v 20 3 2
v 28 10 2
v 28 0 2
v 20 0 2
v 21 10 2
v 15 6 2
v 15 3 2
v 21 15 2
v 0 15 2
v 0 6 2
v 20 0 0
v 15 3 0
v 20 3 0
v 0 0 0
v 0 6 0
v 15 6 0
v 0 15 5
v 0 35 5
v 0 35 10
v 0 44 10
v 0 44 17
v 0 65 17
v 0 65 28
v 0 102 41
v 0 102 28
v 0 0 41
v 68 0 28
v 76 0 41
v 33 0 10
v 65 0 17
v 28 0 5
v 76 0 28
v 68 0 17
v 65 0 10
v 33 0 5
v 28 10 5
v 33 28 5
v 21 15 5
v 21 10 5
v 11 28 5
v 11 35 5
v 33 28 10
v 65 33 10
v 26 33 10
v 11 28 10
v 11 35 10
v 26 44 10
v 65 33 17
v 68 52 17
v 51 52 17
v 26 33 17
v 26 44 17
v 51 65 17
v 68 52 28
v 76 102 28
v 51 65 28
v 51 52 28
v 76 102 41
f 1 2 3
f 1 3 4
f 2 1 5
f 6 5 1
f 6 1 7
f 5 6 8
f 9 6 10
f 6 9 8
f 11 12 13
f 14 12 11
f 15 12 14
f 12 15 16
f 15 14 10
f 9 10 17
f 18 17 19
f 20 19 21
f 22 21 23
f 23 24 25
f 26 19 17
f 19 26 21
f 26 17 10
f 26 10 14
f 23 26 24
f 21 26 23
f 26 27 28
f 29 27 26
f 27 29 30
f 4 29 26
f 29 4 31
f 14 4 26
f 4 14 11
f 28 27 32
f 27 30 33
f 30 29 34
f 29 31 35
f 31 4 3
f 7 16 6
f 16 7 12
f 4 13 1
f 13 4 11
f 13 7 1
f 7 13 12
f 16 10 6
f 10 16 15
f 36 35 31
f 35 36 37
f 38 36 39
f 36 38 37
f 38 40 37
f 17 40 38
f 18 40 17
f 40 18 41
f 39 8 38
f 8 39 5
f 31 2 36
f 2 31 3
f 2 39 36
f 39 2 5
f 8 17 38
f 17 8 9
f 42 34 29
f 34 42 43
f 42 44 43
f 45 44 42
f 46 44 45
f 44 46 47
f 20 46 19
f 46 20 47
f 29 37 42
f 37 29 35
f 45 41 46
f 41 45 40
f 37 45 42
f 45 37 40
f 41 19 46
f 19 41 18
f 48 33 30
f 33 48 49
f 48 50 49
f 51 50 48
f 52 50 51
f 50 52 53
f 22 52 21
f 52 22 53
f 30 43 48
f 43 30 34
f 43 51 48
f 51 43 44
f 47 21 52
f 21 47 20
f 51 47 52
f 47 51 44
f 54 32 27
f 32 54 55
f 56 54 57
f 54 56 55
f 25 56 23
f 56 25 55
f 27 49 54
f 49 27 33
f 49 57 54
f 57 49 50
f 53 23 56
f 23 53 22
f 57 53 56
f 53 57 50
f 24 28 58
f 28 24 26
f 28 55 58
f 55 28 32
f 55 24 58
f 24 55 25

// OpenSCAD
translate([2.5, 1.5, 1.0]) color([0.969306850533619, 0.23531586477578126, 0.13212860983739783]) cube([5, 3, 2], center=true);
translate([7.5, 1.5, 1.0]) color([0.23368957459901674, 0.38460662479298113, 0.6084990843462054]) cube([5, 3, 2], center=true);
translate([12.5, 1.5, 1.0]) color([0.1325407149567407, 0.4984659545183915, 0.9178662904203972]) cube([5, 3, 2], center=true);
translate([17.5, 1.5, 1.0]) color([0.6160167741323543, 0.02601445858505036, 0.596125612844632]) cube([5, 3, 2], center=true);
translate([2.5, 4.5, 1.0]) color([0.48919913512172475, 0.30869925031539414, 0.9586301909392594]) cube([5, 3, 2], center=true);
translate([7.5, 4.5, 1.0]) color([0.5555224541780607, 0.16303723797834868, 0.8790785483620981]) cube([5, 3, 2], center=true);
translate([12.5, 4.5, 1.0]) color([0.8092366229990562, 0.7373715302416316, 0.5460288399006699]) cube([5, 3, 2], center=true);
translate([3.5, 2.5, 3.5]) color([0.7042240787132147, 0.07877233817546292, 0.13744427713979768]) cube([7, 5, 3], center=true);
translate([10.5, 2.5, 3.5]) color([0.40185422229333856, 0.1910666288561843, 0.31642065037316636]) cube([7, 5, 3], center=true);
translate([17.5, 2.5, 3.5]) color([0.2917281417853558, 0.9437754009602987, 0.20866341172373193]) cube([7, 5, 3], center=true);
translate([24.5, 2.5, 3.5]) color([0.3151573145870893, 0.7470721078045024, 0.24960896628473228]) cube([7, 5, 3], center=true);
translate([3.5, 7.5, 3.5]) color([0.8629627260654799, 0.6684326881602258, 0.6597695027130189]) cube([7, 5, 3], center=true);
translate([10.5, 7.5, 3.5]) color([0.22591717735012307, 0.3441717078654829, 0.16233220178561225]) cube([7, 5, 3], center=true);
translate([17.5, 7.5, 3.5]) color([0.01697652307419406, 0.5735931064152219, 0.05818297514553228]) cube([7, 5, 3], center=true);
translate([24.5, 7.5, 3.5]) color([0.6304378073753134, 0.35341956482818127, 0.49110709598533775]) cube([7, 5, 3], center=true);
translate([3.5, 12.5, 3.5]) color([0.06132304686728618, 0.24146702174069912, 0.012441234482642782]) cube([7, 5, 3], center=true);
translate([10.5, 12.5, 3.5]) color([0.9455344576677447, 0.3266678829978785, 0.820956849026723]) cube([7, 5, 3], center=true);
translate([17.5, 12.5, 3.5]) color([0.34492851027915805, 0.6639756368298299, 0.13585073420724958]) cube([7, 5, 3], center=true);
translate([5.5, 3.5, 7.5]) color([0.9219835342207869, 0.44896684911260887, 0.1420549627992148]) cube([11, 7, 5], center=true);
translate([16.5, 3.5, 7.5]) color([0.3119518323014343, 0.6490756968320398, 0.7280642389267371]) cube([11, 7, 5], center=true);
translate([27.5, 3.5, 7.5]) color([0.7852833252199665, 0.40863068686923587, 0.009633238682779877]) cube([11, 7, 5], center=true);
translate([5.5, 10.5, 7.5]) color([0.8909238596539266, 0.533705581213062, 0.8046005274030336]) cube([11, 7, 5], center=true);
translate([16.5, 10.5, 7.5]) color([0.9806276909012095, 0.7049346898693578, 0.7590860206033218]) cube([11, 7, 5], center=true);
translate([27.5, 10.5, 7.5]) color([0.5647284680717275, 0.12259546226958773, 0.9539533584587191]) cube([11, 7, 5], center=true);
translate([5.5, 17.5, 7.5]) color([0.1713156178825357, 0.5005542720722199, 0.621843985236089]) cube([11, 7, 5], center=true);
translate([16.5, 17.5, 7.5]) color([0.6619765424276485, 0.8400519693824264, 0.699601591737329]) cube([11, 7, 5], center=true);
translate([27.5, 17.5, 7.5]) color([0.07964741684534404, 0.23738047361475634, 0.8282556520451495]) cube([11, 7, 5], center=true);
translate([5.5, 24.5, 7.5]) color([0.1762738246231843, 0.9459581227747745, 0.9565644324307663]) cube([11, 7, 5], center=true);
translate([16.5, 24.5, 7.5]) color([0.8963269305888116, 0.7428117304122551, 0.8383436924491765]) cube([11, 7, 5], center=true);
translate([27.5, 24.5, 7.5]) color([0.5614087817692366, 0.7177928021437573, 0.4271772721979724]) cube([11, 7, 5], center=true);
translate([5.5, 31.5, 7.5]) color([0.8646648421725511, 0.10365846470378459, 0.6285317276232824]) cube([11, 7, 5], center=true);
translate([6.5, 5.5, 13.5]) color([0.7101075213407797, 0.6149371087697887, 0.0400488022899097]) cube([13, 11, 7], center=true);
translate([19.5, 5.5, 13.5]) color([0.34025031183581533, 0.7380159626358669, 0.3765176313166855]) cube([13, 11, 7], center=true);
translate([32.5, 5.5, 13.5]) color([0.6257641682954356, 0.8894786539399329, 0.4963449395419606]) cube([13, 11, 7], center=true);
translate([45.5, 5.5, 13.5]) color([0.3583651728386771, 0.6716454412848432, 0.45811681625355094]) cube([13, 11, 7], center=true);
translate([58.5, 5.5, 13.5]) color([0.5074379917667022, 0.16228475224599026, 0.7529781863444399]) cube([13, 11, 7], center=true);
translate([6.5, 16.5, 13.5]) color([0.3376457636791449, 0.8033239356600728, 0.9444207727357242]) cube([13, 11, 7], center=true);
translate([19.5, 16.5, 13.5]) color([0.014783921172948133, 0.5303420268039528, 0.2882277186993394]) cube([13, 11, 7], center=true);
translate([32.5, 16.5, 13.5]) color([0.4689175335863792, 0.03492832759702502, 0.5317931441254861]) cube([13, 11, 7], center=true);
translate([45.5, 16.5, 13.5]) color([0.552095437515129, 0.9340898594770107, 0.03830085289416996]) cube([13, 11, 7], center=true);
translate([58.5, 16.5, 13.5]) color([0.3950652682884612, 0.1200155720396251, 0.34658884626630715]) cube([13, 11, 7], center=true);
translate([6.5, 27.5, 13.5]) color([0.051152415727703016, 0.2730496953424699, 0.9956802504828091]) cube([13, 11, 7], center=true);
translate([19.5, 27.5, 13.5]) color([0.25391998649183944, 0.6803935586065328, 0.7027090324157298]) cube([13, 11, 7], center=true);
translate([32.5, 27.5, 13.5]) color([0.9291230685247301, 0.9949404722907454, 0.7620813713006523]) cube([13, 11, 7], center=true);
translate([45.5, 27.5, 13.5]) color([0.7625973189567923, 0.5162610213479427, 0.3860717563215982]) cube([13, 11, 7], center=true);
translate([58.5, 27.5, 13.5]) color([0.8343975914408754, 0.2506337702942619, 0.11599539642064438]) cube([13, 11, 7], center=true);
translate([6.5, 38.5, 13.5]) color([0.9817240858781537, 0.8047994372884794, 0.9431012043694105]) cube([13, 11, 7], center=true);
translate([19.5, 38.5, 13.5]) color([0.24264659424234813, 0.6738638931519124, 0.5327800265053269]) cube([13, 11, 7], center=true);
translate([8.5, 6.5, 22.5]) color([0.8756440829735669, 0.16255101499230828, 0.8680483691353614]) cube([17, 13, 11], center=true);
translate([25.5, 6.5, 22.5]) color([0.15305579700066485, 0.8462165202751376, 0.8200801239095041]) cube([17, 13, 11], center=true);
translate([42.5, 6.5, 22.5]) color([0.5849326984313064, 0.05125489506773162, 0.156166769208809]) cube([17, 13, 11], center=true);
translate([59.5, 6.5, 22.5]) color([0.34458118202681143, 0.291190613997825, 0.29342424365134856]) cube([17, 13, 11], center=true);
translate([8.5, 19.5, 22.5]) color([0.49485912757206985, 0.40365829021262367, 0.43100562682353716]) cube([17, 13, 11], center=true);
translate([25.5, 19.5, 22.5]) color([0.17003546655932655, 0.788340085303476, 0.5686027559906347]) cube([17, 13, 11], center=true);
translate([42.5, 19.5, 22.5]) color([0.44188886974638586, 0.3413461590512491, 0.009317740415098474]) cube([17, 13, 11], center=true);
translate([59.5, 19.5, 22.5]) color([0.72162474304745, 0.9099060293040379, 0.6642090292154819]) cube([17, 13, 11], center=true);
translate([8.5, 32.5, 22.5]) color([0.6628365798191557, 0.2575988974219705, 0.6122127561841502]) cube([17, 13, 11], center=true);
translate([25.5, 32.5, 22.5]) color([0.07024606726227145, 0.936077955543095, 0.27870721332570936]) cube([17, 13, 11], center=true);
translate([42.5, 32.5, 22.5]) color([0.8301443917589898, 0.5295296249528143, 0.06328696503387199]) cube([17, 13, 11], center=true);
translate([59.5, 32.5, 22.5]) color([0.639390097241117, 0.579686955437464, 0.9416538141960143]) cube([17, 13, 11], center=true);
translate([8.5, 45.5, 22.5]) color([0.6321291610349786, 0.5434228748459046, 0.38469874676133664]) cube([17, 13, 11], center=true);
translate([25.5, 45.5, 22.5]) color([0.434637548519362, 0.31139777068021024, 0.01363511702942577]) cube([17, 13, 11], center=true);
translate([42.5, 45.5, 22.5]) color([0.7785312160167684, 0.8197509625398982, 0.28044077713976767]) cube([17, 13, 11], center=true);
translate([59.5, 45.5, 22.5]) color([0.2581907625337724, 0.5272652548146236, 0.3179301097250754]) cube([17, 13, 11], center=true);
translate([8.5, 58.5, 22.5]) color([0.3422638341038545, 0.7055726929201963, 0.43169639849300545]) cube([17, 13, 11], center=true);
translate([25.5, 58.5, 22.5]) color([0.14170724037842175, 0.0059275683019511805, 0.5113413643489257]) cube([17, 13, 11], center=true);
translate([42.5, 58.5, 22.5]) color([0.7846494738841625, 0.7013909140505133, 0.7815279332048084]) cube([17, 13, 11], center=true);
translate([9.5, 8.5, 34.5]) color([0.38414456219182536, 0.4641305725985776, 0.036369164001931575]) cube([19, 17, 13], center=true);
translate([28.5, 8.5, 34.5]) color([0.9124290899309246, 0.6366653413633517, 0.798477007479407]) cube([19, 17, 13], center=true);
translate([47.5, 8.5, 34.5]) color([0.7602358551941967, 0.899814300356001, 0.3622224295816935]) cube([19, 17, 13], center=true);
translate([66.5, 8.5, 34.5]) color([0.9815510059994267, 0.15851660579635174, 0.19450942151924966]) cube([19, 17, 13], center=true);
translate([9.5, 25.5, 34.5]) color([0.35447317829590397, 0.700089123077614, 0.019141470871264166]) cube([19, 17, 13], center=true);
translate([28.5, 25.5, 34.5]) color([0.7352582011311831, 0.5715587801616956, 0.24207966979200135]) cube([19, 17, 13], center=true);
translate([47.5, 25.5, 34.5]) color([0.18514161515939986, 0.7580746928341441, 0.4199819570625165]) cube([19, 17, 13], center=true);
translate([66.5, 25.5, 34.5]) color([0.5731405723704375, 0.23673356878784502, 0.7138158488992904]) cube([19, 17, 13], center=true);
translate([9.5, 42.5, 34.5]) color([0.8637627475626694, 0.8949592620642776, 0.8103115760161889]) cube([19, 17, 13], center=true);
translate([28.5, 42.5, 34.5]) color([0.1004216369837837, 0.18827941391234093, 0.44049583318501173]) cube([19, 17, 13], center=true);
translate([47.5, 42.5, 34.5]) color([0.06522983258952386, 0.42674703623912436, 0.3947422574489625]) cube([19, 17, 13], center=true);
translate([66.5, 42.5, 34.5]) color([0.27185274848852736, 0.43721657158275895, 0.7577296702077931]) cube([19, 17, 13], center=true);
translate([9.5, 59.5, 34.5]) color([0.3561631337530091, 0.3277620307403001, 0.30701912216942273]) cube([19, 17, 13], center=true);
translate([28.5, 59.5, 34.5]) color([0.492518074892234, 0.7625268269371841, 0.2027877178963453]) cube([19, 17, 13], center=true);
translate([47.5, 59.5, 34.5]) color([0.39789846082497404, 0.4356119392473006, 0.6353731723550147]) cube([19, 17, 13], center=true);
translate([66.5, 59.5, 34.5]) color([0.673076446274384, 0.6970991483341651, 0.8225488218547198]) cube([19, 17, 13], center=true);
translate([9.5, 76.5, 34.5]) color([0.5826892216899469, 0.3545830833155835, 0.5687886411459258]) cube([19, 17, 13], center=true);
translate([28.5, 76.5, 34.5]) color([0.564415288794693, 0.2783497745403337, 0.8220051901362931]) cube([19, 17, 13], center=true);
translate([47.5, 76.5, 34.5]) color([0.39809270556066123, 0.9209203386432881, 0.13533998311747797]) cube([19, 17, 13], center=true);
translate([66.5, 76.5, 34.5]) color([0.08148203466772541, 0.8649487446802395, 0.36102136972914045]) cube([19, 17, 13], center=true);
translate([9.5, 93.5, 34.5]) color([0.06937329613248533, 0.7172877126247486, 0.671396341477498]) cube([19, 17, 13], center=true);
translate([28.5, 93.5, 34.5]) color([0.47110224547326685, 0.3145322421799046, 0.8413649413366762]) cube([19, 17, 13], center=true);
translate([47.5, 93.5, 34.5]) color([0.9545082818366412, 0.02538948740661906, 0.39264862168779513]) cube([19, 17, 13], center=true);
translate([66.5, 93.5, 34.5]) color([0.12527064222330164, 0.9928151500577586, 0.6355716010561779]) cube([19, 17, 13], center=true);
